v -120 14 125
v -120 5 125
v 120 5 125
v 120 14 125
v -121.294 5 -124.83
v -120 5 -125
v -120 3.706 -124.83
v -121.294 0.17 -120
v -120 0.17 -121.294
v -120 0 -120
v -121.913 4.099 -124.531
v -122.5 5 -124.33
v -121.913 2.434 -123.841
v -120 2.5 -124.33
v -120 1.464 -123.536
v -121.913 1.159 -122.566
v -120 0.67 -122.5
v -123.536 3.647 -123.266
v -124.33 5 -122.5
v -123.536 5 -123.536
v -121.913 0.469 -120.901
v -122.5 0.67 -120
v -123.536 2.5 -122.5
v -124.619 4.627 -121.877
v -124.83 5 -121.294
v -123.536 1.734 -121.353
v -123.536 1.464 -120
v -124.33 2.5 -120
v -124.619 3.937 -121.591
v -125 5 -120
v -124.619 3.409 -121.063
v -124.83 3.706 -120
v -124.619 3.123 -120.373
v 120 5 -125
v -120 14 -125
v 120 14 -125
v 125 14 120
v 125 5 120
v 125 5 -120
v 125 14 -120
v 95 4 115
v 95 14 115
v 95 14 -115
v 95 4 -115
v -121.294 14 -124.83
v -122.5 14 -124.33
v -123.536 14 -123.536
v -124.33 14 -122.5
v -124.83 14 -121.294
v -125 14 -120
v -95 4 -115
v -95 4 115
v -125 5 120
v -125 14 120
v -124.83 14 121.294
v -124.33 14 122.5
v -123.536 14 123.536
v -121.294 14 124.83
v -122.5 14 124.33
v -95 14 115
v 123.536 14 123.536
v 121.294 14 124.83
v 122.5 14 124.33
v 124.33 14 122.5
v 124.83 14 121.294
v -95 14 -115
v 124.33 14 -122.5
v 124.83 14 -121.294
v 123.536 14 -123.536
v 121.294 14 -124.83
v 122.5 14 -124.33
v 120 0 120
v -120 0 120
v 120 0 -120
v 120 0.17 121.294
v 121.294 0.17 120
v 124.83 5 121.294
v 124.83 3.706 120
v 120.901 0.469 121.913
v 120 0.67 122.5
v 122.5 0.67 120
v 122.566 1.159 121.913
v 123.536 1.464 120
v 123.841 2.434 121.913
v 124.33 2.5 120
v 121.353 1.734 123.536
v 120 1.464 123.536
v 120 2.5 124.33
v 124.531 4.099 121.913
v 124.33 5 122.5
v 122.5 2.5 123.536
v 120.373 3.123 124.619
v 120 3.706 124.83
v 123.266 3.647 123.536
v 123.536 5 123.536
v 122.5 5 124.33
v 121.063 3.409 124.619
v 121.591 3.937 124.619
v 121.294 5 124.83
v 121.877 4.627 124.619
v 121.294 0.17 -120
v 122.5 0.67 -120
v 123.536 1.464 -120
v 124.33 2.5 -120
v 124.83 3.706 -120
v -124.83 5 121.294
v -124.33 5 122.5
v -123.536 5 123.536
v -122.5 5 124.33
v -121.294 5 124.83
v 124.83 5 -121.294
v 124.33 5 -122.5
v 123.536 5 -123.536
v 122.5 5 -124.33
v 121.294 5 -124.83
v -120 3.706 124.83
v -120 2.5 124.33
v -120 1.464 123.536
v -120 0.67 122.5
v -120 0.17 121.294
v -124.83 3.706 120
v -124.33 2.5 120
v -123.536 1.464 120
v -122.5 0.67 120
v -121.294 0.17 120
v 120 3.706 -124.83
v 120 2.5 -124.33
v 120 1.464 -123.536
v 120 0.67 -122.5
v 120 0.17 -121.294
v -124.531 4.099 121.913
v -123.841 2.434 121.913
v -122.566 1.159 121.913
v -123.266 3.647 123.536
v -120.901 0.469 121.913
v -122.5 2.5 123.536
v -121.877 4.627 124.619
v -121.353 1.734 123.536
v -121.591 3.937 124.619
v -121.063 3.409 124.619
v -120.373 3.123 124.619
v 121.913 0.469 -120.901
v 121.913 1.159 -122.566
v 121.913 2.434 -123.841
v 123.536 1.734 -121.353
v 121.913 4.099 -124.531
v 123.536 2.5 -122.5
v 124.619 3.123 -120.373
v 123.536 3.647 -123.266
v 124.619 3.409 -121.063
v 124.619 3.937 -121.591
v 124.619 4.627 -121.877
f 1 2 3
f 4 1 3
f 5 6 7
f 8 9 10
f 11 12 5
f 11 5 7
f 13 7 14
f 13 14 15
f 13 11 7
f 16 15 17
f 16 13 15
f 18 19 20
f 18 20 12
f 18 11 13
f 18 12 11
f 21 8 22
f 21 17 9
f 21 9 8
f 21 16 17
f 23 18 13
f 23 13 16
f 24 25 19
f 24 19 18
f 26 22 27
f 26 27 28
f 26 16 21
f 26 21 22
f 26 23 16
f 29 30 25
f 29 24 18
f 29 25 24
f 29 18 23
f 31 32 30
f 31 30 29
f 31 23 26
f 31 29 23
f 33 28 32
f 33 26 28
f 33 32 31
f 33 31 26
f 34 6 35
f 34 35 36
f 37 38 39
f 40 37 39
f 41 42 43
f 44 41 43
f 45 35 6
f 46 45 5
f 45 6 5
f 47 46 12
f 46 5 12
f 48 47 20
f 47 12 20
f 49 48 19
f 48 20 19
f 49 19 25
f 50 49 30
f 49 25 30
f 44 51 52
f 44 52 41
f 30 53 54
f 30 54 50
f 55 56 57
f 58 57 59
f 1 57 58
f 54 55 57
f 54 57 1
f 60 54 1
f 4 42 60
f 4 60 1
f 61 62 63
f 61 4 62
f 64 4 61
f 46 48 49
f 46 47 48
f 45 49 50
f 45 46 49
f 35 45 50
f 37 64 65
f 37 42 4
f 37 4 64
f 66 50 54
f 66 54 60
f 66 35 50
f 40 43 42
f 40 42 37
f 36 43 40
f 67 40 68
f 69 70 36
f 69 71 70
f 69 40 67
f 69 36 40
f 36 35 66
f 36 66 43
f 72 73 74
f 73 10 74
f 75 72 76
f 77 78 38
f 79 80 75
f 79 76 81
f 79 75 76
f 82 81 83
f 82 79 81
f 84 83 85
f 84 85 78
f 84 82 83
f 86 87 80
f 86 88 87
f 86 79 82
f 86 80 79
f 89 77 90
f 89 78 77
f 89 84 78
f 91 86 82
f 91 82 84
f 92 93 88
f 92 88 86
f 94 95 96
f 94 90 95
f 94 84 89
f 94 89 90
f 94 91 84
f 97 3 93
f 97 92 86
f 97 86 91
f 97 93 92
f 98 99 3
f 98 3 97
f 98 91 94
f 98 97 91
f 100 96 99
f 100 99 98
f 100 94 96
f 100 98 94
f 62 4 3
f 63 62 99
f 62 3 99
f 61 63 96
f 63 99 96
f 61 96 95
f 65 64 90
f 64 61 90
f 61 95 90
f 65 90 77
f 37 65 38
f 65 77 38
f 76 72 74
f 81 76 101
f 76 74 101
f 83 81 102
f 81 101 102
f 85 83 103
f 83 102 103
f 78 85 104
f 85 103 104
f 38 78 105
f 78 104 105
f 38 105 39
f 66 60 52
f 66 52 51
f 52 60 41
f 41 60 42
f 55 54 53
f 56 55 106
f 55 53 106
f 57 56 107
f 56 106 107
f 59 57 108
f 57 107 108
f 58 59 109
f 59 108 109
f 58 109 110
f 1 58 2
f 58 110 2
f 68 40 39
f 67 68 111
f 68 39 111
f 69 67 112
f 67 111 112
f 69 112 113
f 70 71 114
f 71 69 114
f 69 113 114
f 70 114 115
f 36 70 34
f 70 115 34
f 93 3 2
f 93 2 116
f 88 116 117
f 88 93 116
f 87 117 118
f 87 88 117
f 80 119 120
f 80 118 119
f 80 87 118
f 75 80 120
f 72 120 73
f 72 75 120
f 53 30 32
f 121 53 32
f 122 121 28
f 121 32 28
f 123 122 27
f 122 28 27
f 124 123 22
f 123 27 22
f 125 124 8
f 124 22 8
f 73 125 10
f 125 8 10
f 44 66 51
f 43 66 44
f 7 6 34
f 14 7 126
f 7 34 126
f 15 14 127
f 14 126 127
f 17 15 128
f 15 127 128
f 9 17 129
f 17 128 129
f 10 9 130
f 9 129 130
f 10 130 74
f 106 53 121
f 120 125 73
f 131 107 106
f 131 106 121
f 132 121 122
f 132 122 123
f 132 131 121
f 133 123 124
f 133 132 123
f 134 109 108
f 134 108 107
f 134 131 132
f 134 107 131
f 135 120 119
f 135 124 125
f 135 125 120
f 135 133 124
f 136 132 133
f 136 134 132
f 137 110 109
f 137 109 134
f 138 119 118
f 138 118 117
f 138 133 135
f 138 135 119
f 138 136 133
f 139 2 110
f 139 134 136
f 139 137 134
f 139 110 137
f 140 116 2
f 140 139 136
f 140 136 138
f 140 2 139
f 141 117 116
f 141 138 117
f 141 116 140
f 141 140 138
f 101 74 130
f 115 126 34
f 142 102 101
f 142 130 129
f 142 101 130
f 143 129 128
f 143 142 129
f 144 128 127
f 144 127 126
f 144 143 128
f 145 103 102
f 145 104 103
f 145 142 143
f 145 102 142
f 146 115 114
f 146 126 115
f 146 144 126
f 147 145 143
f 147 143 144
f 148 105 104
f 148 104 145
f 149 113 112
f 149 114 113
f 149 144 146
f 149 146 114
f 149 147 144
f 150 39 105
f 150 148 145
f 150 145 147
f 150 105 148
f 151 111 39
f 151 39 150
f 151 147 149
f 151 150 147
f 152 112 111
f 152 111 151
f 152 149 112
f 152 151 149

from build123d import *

# Parameters (mm, degrees)
SKETCH1_W          = 250
SKETCH1_H          = 250
BASE_DEPTH         = 14
SKETCH3_W          = 190
SKETCH3_H          = 230
CUT_EXTRUDE1_DEPTH = 10
FILLET1_R          = 5
FILLET2_R          = 5


with BuildPart() as part:
    # Sketch1 → Base (new body)
    with BuildSketch(Plane(origin=(0, 0, 0), x_dir=(1, 0, 0), z_dir=(0, 1, 0))):
        Rectangle(SKETCH1_W, SKETCH1_H)
    extrude(amount=BASE_DEPTH)

    # Sketch3 → Cut-Extrude1 (cut)
    with BuildSketch(Plane(origin=(0, 14, 0), x_dir=(1, 0, 0), z_dir=(0, 1, 0))):
        Rectangle(SKETCH3_W, SKETCH3_H)
    extrude(amount=-CUT_EXTRUDE1_DEPTH, mode=Mode.SUBTRACT)

    # Fillet1
    fillet1_edges = [part.edges().sort_by_distance(p)[0] for p in [
        (0, 0, 125),
        (-125, 0, 0),
        (0, 0, -125),
        (125, 0, 0),
    ]]
    fillet(fillet1_edges, radius=FILLET1_R)

    # Fillet2
    # the kernel refuses this fillet: 5 mm, written as the material it takes off along each edge
    with BuildSketch(Plane(origin=(120, 5, 120), x_dir=(1, 0, 0), z_dir=(0, 0, 1))) as fillet2_piece_1_section:
        Polygon((0, 0), (FILLET2_R, 0), (FILLET2_R, -FILLET2_R), (0, -FILLET2_R), align=None)
    fillet2_piece_1 = extrude(amount=FILLET2_R, mode=Mode.PRIVATE)
    fillet2_piece_1 = fillet2_piece_1 - Plane(origin=(120, 5, 120), x_dir=(-0.7071067811865475, 0.7071067811865475, 0), z_dir=(0, 0, 1)) * Sphere(FILLET2_R, mode=Mode.PRIVATE)
    add(fillet2_piece_1, mode=Mode.SUBTRACT)
    with BuildSketch(Plane(origin=(-120, 5, 120), x_dir=(-1, 0, 0), z_dir=(0, 0, 1))) as fillet2_piece_2_section:
        Polygon((0, 0), (FILLET2_R, 0), (FILLET2_R, FILLET2_R), (0, FILLET2_R), align=None)
    fillet2_piece_2 = extrude(amount=FILLET2_R, mode=Mode.PRIVATE)
    fillet2_piece_2 = fillet2_piece_2 - Plane(origin=(-120, 5, 120), x_dir=(0.7071067811865475, 0.7071067811865475, 0), z_dir=(0, 0, 1)) * Sphere(FILLET2_R, mode=Mode.PRIVATE)
    add(fillet2_piece_2, mode=Mode.SUBTRACT)
    with BuildSketch(Plane(origin=(120, 5, -120), x_dir=(0, 0, -1), z_dir=(1, 0, 0))) as fillet2_piece_3_section:
        Polygon((0, 0), (FILLET2_R, 0), (FILLET2_R, -FILLET2_R), (0, -FILLET2_R), align=None)
    fillet2_piece_3 = extrude(amount=FILLET2_R, mode=Mode.PRIVATE)
    fillet2_piece_3 = fillet2_piece_3 - Plane(origin=(120, 5, -120), x_dir=(0, 0.7071067811865475, 0.7071067811865475), z_dir=(1, 0, 0)) * Sphere(FILLET2_R, mode=Mode.PRIVATE)
    add(fillet2_piece_3, mode=Mode.SUBTRACT)
    with BuildSketch(Plane(origin=(-120, 5, -120), x_dir=(0, 0, -1), z_dir=(-1, 0, 0))) as fillet2_piece_4_section:
        Polygon((0, 0), (FILLET2_R, 0), (FILLET2_R, FILLET2_R), (0, FILLET2_R), align=None)
    fillet2_piece_4 = extrude(amount=FILLET2_R, mode=Mode.PRIVATE)
    fillet2_piece_4 = fillet2_piece_4 - Plane(origin=(-120, 5, -120), x_dir=(0, 0.7071067811865475, 0.7071067811865475), z_dir=(-1, 0, 0)) * Sphere(FILLET2_R, mode=Mode.PRIVATE)
    add(fillet2_piece_4, mode=Mode.SUBTRACT)
    with BuildSketch(Plane(origin=(125, 5, 125), x_dir=(-1, 0, 0), z_dir=(0, 1, 0)), Plane(origin=(125, 5, -125), x_dir=(0, 0, 1), z_dir=(0, 1, 0))) as fillet2_piece_5:
        with BuildLine():
            CenterArc((FILLET2_R, -FILLET2_R), FILLET2_R, 90, 90)
            Line((0, -FILLET2_R), (0, 0))
            Line((0, 0), (FILLET2_R, 0))
        make_face()
    extrude(amount=21.5, mode=Mode.SUBTRACT)
    with BuildSketch(Plane(origin=(-125, 5, 125), x_dir=(1, 0, 0), z_dir=(0, 1, 0)), Plane(origin=(-125, 5, -125), x_dir=(0, 0, 1), z_dir=(0, 1, 0))) as fillet2_piece_6:
        with BuildLine():
            CenterArc((FILLET2_R, FILLET2_R), FILLET2_R, 180, 90)
            Line((0, FILLET2_R), (0, 0))
            Line((0, 0), (FILLET2_R, 0))
        make_face()
    extrude(amount=21.5, mode=Mode.SUBTRACT)


solid = part.part
